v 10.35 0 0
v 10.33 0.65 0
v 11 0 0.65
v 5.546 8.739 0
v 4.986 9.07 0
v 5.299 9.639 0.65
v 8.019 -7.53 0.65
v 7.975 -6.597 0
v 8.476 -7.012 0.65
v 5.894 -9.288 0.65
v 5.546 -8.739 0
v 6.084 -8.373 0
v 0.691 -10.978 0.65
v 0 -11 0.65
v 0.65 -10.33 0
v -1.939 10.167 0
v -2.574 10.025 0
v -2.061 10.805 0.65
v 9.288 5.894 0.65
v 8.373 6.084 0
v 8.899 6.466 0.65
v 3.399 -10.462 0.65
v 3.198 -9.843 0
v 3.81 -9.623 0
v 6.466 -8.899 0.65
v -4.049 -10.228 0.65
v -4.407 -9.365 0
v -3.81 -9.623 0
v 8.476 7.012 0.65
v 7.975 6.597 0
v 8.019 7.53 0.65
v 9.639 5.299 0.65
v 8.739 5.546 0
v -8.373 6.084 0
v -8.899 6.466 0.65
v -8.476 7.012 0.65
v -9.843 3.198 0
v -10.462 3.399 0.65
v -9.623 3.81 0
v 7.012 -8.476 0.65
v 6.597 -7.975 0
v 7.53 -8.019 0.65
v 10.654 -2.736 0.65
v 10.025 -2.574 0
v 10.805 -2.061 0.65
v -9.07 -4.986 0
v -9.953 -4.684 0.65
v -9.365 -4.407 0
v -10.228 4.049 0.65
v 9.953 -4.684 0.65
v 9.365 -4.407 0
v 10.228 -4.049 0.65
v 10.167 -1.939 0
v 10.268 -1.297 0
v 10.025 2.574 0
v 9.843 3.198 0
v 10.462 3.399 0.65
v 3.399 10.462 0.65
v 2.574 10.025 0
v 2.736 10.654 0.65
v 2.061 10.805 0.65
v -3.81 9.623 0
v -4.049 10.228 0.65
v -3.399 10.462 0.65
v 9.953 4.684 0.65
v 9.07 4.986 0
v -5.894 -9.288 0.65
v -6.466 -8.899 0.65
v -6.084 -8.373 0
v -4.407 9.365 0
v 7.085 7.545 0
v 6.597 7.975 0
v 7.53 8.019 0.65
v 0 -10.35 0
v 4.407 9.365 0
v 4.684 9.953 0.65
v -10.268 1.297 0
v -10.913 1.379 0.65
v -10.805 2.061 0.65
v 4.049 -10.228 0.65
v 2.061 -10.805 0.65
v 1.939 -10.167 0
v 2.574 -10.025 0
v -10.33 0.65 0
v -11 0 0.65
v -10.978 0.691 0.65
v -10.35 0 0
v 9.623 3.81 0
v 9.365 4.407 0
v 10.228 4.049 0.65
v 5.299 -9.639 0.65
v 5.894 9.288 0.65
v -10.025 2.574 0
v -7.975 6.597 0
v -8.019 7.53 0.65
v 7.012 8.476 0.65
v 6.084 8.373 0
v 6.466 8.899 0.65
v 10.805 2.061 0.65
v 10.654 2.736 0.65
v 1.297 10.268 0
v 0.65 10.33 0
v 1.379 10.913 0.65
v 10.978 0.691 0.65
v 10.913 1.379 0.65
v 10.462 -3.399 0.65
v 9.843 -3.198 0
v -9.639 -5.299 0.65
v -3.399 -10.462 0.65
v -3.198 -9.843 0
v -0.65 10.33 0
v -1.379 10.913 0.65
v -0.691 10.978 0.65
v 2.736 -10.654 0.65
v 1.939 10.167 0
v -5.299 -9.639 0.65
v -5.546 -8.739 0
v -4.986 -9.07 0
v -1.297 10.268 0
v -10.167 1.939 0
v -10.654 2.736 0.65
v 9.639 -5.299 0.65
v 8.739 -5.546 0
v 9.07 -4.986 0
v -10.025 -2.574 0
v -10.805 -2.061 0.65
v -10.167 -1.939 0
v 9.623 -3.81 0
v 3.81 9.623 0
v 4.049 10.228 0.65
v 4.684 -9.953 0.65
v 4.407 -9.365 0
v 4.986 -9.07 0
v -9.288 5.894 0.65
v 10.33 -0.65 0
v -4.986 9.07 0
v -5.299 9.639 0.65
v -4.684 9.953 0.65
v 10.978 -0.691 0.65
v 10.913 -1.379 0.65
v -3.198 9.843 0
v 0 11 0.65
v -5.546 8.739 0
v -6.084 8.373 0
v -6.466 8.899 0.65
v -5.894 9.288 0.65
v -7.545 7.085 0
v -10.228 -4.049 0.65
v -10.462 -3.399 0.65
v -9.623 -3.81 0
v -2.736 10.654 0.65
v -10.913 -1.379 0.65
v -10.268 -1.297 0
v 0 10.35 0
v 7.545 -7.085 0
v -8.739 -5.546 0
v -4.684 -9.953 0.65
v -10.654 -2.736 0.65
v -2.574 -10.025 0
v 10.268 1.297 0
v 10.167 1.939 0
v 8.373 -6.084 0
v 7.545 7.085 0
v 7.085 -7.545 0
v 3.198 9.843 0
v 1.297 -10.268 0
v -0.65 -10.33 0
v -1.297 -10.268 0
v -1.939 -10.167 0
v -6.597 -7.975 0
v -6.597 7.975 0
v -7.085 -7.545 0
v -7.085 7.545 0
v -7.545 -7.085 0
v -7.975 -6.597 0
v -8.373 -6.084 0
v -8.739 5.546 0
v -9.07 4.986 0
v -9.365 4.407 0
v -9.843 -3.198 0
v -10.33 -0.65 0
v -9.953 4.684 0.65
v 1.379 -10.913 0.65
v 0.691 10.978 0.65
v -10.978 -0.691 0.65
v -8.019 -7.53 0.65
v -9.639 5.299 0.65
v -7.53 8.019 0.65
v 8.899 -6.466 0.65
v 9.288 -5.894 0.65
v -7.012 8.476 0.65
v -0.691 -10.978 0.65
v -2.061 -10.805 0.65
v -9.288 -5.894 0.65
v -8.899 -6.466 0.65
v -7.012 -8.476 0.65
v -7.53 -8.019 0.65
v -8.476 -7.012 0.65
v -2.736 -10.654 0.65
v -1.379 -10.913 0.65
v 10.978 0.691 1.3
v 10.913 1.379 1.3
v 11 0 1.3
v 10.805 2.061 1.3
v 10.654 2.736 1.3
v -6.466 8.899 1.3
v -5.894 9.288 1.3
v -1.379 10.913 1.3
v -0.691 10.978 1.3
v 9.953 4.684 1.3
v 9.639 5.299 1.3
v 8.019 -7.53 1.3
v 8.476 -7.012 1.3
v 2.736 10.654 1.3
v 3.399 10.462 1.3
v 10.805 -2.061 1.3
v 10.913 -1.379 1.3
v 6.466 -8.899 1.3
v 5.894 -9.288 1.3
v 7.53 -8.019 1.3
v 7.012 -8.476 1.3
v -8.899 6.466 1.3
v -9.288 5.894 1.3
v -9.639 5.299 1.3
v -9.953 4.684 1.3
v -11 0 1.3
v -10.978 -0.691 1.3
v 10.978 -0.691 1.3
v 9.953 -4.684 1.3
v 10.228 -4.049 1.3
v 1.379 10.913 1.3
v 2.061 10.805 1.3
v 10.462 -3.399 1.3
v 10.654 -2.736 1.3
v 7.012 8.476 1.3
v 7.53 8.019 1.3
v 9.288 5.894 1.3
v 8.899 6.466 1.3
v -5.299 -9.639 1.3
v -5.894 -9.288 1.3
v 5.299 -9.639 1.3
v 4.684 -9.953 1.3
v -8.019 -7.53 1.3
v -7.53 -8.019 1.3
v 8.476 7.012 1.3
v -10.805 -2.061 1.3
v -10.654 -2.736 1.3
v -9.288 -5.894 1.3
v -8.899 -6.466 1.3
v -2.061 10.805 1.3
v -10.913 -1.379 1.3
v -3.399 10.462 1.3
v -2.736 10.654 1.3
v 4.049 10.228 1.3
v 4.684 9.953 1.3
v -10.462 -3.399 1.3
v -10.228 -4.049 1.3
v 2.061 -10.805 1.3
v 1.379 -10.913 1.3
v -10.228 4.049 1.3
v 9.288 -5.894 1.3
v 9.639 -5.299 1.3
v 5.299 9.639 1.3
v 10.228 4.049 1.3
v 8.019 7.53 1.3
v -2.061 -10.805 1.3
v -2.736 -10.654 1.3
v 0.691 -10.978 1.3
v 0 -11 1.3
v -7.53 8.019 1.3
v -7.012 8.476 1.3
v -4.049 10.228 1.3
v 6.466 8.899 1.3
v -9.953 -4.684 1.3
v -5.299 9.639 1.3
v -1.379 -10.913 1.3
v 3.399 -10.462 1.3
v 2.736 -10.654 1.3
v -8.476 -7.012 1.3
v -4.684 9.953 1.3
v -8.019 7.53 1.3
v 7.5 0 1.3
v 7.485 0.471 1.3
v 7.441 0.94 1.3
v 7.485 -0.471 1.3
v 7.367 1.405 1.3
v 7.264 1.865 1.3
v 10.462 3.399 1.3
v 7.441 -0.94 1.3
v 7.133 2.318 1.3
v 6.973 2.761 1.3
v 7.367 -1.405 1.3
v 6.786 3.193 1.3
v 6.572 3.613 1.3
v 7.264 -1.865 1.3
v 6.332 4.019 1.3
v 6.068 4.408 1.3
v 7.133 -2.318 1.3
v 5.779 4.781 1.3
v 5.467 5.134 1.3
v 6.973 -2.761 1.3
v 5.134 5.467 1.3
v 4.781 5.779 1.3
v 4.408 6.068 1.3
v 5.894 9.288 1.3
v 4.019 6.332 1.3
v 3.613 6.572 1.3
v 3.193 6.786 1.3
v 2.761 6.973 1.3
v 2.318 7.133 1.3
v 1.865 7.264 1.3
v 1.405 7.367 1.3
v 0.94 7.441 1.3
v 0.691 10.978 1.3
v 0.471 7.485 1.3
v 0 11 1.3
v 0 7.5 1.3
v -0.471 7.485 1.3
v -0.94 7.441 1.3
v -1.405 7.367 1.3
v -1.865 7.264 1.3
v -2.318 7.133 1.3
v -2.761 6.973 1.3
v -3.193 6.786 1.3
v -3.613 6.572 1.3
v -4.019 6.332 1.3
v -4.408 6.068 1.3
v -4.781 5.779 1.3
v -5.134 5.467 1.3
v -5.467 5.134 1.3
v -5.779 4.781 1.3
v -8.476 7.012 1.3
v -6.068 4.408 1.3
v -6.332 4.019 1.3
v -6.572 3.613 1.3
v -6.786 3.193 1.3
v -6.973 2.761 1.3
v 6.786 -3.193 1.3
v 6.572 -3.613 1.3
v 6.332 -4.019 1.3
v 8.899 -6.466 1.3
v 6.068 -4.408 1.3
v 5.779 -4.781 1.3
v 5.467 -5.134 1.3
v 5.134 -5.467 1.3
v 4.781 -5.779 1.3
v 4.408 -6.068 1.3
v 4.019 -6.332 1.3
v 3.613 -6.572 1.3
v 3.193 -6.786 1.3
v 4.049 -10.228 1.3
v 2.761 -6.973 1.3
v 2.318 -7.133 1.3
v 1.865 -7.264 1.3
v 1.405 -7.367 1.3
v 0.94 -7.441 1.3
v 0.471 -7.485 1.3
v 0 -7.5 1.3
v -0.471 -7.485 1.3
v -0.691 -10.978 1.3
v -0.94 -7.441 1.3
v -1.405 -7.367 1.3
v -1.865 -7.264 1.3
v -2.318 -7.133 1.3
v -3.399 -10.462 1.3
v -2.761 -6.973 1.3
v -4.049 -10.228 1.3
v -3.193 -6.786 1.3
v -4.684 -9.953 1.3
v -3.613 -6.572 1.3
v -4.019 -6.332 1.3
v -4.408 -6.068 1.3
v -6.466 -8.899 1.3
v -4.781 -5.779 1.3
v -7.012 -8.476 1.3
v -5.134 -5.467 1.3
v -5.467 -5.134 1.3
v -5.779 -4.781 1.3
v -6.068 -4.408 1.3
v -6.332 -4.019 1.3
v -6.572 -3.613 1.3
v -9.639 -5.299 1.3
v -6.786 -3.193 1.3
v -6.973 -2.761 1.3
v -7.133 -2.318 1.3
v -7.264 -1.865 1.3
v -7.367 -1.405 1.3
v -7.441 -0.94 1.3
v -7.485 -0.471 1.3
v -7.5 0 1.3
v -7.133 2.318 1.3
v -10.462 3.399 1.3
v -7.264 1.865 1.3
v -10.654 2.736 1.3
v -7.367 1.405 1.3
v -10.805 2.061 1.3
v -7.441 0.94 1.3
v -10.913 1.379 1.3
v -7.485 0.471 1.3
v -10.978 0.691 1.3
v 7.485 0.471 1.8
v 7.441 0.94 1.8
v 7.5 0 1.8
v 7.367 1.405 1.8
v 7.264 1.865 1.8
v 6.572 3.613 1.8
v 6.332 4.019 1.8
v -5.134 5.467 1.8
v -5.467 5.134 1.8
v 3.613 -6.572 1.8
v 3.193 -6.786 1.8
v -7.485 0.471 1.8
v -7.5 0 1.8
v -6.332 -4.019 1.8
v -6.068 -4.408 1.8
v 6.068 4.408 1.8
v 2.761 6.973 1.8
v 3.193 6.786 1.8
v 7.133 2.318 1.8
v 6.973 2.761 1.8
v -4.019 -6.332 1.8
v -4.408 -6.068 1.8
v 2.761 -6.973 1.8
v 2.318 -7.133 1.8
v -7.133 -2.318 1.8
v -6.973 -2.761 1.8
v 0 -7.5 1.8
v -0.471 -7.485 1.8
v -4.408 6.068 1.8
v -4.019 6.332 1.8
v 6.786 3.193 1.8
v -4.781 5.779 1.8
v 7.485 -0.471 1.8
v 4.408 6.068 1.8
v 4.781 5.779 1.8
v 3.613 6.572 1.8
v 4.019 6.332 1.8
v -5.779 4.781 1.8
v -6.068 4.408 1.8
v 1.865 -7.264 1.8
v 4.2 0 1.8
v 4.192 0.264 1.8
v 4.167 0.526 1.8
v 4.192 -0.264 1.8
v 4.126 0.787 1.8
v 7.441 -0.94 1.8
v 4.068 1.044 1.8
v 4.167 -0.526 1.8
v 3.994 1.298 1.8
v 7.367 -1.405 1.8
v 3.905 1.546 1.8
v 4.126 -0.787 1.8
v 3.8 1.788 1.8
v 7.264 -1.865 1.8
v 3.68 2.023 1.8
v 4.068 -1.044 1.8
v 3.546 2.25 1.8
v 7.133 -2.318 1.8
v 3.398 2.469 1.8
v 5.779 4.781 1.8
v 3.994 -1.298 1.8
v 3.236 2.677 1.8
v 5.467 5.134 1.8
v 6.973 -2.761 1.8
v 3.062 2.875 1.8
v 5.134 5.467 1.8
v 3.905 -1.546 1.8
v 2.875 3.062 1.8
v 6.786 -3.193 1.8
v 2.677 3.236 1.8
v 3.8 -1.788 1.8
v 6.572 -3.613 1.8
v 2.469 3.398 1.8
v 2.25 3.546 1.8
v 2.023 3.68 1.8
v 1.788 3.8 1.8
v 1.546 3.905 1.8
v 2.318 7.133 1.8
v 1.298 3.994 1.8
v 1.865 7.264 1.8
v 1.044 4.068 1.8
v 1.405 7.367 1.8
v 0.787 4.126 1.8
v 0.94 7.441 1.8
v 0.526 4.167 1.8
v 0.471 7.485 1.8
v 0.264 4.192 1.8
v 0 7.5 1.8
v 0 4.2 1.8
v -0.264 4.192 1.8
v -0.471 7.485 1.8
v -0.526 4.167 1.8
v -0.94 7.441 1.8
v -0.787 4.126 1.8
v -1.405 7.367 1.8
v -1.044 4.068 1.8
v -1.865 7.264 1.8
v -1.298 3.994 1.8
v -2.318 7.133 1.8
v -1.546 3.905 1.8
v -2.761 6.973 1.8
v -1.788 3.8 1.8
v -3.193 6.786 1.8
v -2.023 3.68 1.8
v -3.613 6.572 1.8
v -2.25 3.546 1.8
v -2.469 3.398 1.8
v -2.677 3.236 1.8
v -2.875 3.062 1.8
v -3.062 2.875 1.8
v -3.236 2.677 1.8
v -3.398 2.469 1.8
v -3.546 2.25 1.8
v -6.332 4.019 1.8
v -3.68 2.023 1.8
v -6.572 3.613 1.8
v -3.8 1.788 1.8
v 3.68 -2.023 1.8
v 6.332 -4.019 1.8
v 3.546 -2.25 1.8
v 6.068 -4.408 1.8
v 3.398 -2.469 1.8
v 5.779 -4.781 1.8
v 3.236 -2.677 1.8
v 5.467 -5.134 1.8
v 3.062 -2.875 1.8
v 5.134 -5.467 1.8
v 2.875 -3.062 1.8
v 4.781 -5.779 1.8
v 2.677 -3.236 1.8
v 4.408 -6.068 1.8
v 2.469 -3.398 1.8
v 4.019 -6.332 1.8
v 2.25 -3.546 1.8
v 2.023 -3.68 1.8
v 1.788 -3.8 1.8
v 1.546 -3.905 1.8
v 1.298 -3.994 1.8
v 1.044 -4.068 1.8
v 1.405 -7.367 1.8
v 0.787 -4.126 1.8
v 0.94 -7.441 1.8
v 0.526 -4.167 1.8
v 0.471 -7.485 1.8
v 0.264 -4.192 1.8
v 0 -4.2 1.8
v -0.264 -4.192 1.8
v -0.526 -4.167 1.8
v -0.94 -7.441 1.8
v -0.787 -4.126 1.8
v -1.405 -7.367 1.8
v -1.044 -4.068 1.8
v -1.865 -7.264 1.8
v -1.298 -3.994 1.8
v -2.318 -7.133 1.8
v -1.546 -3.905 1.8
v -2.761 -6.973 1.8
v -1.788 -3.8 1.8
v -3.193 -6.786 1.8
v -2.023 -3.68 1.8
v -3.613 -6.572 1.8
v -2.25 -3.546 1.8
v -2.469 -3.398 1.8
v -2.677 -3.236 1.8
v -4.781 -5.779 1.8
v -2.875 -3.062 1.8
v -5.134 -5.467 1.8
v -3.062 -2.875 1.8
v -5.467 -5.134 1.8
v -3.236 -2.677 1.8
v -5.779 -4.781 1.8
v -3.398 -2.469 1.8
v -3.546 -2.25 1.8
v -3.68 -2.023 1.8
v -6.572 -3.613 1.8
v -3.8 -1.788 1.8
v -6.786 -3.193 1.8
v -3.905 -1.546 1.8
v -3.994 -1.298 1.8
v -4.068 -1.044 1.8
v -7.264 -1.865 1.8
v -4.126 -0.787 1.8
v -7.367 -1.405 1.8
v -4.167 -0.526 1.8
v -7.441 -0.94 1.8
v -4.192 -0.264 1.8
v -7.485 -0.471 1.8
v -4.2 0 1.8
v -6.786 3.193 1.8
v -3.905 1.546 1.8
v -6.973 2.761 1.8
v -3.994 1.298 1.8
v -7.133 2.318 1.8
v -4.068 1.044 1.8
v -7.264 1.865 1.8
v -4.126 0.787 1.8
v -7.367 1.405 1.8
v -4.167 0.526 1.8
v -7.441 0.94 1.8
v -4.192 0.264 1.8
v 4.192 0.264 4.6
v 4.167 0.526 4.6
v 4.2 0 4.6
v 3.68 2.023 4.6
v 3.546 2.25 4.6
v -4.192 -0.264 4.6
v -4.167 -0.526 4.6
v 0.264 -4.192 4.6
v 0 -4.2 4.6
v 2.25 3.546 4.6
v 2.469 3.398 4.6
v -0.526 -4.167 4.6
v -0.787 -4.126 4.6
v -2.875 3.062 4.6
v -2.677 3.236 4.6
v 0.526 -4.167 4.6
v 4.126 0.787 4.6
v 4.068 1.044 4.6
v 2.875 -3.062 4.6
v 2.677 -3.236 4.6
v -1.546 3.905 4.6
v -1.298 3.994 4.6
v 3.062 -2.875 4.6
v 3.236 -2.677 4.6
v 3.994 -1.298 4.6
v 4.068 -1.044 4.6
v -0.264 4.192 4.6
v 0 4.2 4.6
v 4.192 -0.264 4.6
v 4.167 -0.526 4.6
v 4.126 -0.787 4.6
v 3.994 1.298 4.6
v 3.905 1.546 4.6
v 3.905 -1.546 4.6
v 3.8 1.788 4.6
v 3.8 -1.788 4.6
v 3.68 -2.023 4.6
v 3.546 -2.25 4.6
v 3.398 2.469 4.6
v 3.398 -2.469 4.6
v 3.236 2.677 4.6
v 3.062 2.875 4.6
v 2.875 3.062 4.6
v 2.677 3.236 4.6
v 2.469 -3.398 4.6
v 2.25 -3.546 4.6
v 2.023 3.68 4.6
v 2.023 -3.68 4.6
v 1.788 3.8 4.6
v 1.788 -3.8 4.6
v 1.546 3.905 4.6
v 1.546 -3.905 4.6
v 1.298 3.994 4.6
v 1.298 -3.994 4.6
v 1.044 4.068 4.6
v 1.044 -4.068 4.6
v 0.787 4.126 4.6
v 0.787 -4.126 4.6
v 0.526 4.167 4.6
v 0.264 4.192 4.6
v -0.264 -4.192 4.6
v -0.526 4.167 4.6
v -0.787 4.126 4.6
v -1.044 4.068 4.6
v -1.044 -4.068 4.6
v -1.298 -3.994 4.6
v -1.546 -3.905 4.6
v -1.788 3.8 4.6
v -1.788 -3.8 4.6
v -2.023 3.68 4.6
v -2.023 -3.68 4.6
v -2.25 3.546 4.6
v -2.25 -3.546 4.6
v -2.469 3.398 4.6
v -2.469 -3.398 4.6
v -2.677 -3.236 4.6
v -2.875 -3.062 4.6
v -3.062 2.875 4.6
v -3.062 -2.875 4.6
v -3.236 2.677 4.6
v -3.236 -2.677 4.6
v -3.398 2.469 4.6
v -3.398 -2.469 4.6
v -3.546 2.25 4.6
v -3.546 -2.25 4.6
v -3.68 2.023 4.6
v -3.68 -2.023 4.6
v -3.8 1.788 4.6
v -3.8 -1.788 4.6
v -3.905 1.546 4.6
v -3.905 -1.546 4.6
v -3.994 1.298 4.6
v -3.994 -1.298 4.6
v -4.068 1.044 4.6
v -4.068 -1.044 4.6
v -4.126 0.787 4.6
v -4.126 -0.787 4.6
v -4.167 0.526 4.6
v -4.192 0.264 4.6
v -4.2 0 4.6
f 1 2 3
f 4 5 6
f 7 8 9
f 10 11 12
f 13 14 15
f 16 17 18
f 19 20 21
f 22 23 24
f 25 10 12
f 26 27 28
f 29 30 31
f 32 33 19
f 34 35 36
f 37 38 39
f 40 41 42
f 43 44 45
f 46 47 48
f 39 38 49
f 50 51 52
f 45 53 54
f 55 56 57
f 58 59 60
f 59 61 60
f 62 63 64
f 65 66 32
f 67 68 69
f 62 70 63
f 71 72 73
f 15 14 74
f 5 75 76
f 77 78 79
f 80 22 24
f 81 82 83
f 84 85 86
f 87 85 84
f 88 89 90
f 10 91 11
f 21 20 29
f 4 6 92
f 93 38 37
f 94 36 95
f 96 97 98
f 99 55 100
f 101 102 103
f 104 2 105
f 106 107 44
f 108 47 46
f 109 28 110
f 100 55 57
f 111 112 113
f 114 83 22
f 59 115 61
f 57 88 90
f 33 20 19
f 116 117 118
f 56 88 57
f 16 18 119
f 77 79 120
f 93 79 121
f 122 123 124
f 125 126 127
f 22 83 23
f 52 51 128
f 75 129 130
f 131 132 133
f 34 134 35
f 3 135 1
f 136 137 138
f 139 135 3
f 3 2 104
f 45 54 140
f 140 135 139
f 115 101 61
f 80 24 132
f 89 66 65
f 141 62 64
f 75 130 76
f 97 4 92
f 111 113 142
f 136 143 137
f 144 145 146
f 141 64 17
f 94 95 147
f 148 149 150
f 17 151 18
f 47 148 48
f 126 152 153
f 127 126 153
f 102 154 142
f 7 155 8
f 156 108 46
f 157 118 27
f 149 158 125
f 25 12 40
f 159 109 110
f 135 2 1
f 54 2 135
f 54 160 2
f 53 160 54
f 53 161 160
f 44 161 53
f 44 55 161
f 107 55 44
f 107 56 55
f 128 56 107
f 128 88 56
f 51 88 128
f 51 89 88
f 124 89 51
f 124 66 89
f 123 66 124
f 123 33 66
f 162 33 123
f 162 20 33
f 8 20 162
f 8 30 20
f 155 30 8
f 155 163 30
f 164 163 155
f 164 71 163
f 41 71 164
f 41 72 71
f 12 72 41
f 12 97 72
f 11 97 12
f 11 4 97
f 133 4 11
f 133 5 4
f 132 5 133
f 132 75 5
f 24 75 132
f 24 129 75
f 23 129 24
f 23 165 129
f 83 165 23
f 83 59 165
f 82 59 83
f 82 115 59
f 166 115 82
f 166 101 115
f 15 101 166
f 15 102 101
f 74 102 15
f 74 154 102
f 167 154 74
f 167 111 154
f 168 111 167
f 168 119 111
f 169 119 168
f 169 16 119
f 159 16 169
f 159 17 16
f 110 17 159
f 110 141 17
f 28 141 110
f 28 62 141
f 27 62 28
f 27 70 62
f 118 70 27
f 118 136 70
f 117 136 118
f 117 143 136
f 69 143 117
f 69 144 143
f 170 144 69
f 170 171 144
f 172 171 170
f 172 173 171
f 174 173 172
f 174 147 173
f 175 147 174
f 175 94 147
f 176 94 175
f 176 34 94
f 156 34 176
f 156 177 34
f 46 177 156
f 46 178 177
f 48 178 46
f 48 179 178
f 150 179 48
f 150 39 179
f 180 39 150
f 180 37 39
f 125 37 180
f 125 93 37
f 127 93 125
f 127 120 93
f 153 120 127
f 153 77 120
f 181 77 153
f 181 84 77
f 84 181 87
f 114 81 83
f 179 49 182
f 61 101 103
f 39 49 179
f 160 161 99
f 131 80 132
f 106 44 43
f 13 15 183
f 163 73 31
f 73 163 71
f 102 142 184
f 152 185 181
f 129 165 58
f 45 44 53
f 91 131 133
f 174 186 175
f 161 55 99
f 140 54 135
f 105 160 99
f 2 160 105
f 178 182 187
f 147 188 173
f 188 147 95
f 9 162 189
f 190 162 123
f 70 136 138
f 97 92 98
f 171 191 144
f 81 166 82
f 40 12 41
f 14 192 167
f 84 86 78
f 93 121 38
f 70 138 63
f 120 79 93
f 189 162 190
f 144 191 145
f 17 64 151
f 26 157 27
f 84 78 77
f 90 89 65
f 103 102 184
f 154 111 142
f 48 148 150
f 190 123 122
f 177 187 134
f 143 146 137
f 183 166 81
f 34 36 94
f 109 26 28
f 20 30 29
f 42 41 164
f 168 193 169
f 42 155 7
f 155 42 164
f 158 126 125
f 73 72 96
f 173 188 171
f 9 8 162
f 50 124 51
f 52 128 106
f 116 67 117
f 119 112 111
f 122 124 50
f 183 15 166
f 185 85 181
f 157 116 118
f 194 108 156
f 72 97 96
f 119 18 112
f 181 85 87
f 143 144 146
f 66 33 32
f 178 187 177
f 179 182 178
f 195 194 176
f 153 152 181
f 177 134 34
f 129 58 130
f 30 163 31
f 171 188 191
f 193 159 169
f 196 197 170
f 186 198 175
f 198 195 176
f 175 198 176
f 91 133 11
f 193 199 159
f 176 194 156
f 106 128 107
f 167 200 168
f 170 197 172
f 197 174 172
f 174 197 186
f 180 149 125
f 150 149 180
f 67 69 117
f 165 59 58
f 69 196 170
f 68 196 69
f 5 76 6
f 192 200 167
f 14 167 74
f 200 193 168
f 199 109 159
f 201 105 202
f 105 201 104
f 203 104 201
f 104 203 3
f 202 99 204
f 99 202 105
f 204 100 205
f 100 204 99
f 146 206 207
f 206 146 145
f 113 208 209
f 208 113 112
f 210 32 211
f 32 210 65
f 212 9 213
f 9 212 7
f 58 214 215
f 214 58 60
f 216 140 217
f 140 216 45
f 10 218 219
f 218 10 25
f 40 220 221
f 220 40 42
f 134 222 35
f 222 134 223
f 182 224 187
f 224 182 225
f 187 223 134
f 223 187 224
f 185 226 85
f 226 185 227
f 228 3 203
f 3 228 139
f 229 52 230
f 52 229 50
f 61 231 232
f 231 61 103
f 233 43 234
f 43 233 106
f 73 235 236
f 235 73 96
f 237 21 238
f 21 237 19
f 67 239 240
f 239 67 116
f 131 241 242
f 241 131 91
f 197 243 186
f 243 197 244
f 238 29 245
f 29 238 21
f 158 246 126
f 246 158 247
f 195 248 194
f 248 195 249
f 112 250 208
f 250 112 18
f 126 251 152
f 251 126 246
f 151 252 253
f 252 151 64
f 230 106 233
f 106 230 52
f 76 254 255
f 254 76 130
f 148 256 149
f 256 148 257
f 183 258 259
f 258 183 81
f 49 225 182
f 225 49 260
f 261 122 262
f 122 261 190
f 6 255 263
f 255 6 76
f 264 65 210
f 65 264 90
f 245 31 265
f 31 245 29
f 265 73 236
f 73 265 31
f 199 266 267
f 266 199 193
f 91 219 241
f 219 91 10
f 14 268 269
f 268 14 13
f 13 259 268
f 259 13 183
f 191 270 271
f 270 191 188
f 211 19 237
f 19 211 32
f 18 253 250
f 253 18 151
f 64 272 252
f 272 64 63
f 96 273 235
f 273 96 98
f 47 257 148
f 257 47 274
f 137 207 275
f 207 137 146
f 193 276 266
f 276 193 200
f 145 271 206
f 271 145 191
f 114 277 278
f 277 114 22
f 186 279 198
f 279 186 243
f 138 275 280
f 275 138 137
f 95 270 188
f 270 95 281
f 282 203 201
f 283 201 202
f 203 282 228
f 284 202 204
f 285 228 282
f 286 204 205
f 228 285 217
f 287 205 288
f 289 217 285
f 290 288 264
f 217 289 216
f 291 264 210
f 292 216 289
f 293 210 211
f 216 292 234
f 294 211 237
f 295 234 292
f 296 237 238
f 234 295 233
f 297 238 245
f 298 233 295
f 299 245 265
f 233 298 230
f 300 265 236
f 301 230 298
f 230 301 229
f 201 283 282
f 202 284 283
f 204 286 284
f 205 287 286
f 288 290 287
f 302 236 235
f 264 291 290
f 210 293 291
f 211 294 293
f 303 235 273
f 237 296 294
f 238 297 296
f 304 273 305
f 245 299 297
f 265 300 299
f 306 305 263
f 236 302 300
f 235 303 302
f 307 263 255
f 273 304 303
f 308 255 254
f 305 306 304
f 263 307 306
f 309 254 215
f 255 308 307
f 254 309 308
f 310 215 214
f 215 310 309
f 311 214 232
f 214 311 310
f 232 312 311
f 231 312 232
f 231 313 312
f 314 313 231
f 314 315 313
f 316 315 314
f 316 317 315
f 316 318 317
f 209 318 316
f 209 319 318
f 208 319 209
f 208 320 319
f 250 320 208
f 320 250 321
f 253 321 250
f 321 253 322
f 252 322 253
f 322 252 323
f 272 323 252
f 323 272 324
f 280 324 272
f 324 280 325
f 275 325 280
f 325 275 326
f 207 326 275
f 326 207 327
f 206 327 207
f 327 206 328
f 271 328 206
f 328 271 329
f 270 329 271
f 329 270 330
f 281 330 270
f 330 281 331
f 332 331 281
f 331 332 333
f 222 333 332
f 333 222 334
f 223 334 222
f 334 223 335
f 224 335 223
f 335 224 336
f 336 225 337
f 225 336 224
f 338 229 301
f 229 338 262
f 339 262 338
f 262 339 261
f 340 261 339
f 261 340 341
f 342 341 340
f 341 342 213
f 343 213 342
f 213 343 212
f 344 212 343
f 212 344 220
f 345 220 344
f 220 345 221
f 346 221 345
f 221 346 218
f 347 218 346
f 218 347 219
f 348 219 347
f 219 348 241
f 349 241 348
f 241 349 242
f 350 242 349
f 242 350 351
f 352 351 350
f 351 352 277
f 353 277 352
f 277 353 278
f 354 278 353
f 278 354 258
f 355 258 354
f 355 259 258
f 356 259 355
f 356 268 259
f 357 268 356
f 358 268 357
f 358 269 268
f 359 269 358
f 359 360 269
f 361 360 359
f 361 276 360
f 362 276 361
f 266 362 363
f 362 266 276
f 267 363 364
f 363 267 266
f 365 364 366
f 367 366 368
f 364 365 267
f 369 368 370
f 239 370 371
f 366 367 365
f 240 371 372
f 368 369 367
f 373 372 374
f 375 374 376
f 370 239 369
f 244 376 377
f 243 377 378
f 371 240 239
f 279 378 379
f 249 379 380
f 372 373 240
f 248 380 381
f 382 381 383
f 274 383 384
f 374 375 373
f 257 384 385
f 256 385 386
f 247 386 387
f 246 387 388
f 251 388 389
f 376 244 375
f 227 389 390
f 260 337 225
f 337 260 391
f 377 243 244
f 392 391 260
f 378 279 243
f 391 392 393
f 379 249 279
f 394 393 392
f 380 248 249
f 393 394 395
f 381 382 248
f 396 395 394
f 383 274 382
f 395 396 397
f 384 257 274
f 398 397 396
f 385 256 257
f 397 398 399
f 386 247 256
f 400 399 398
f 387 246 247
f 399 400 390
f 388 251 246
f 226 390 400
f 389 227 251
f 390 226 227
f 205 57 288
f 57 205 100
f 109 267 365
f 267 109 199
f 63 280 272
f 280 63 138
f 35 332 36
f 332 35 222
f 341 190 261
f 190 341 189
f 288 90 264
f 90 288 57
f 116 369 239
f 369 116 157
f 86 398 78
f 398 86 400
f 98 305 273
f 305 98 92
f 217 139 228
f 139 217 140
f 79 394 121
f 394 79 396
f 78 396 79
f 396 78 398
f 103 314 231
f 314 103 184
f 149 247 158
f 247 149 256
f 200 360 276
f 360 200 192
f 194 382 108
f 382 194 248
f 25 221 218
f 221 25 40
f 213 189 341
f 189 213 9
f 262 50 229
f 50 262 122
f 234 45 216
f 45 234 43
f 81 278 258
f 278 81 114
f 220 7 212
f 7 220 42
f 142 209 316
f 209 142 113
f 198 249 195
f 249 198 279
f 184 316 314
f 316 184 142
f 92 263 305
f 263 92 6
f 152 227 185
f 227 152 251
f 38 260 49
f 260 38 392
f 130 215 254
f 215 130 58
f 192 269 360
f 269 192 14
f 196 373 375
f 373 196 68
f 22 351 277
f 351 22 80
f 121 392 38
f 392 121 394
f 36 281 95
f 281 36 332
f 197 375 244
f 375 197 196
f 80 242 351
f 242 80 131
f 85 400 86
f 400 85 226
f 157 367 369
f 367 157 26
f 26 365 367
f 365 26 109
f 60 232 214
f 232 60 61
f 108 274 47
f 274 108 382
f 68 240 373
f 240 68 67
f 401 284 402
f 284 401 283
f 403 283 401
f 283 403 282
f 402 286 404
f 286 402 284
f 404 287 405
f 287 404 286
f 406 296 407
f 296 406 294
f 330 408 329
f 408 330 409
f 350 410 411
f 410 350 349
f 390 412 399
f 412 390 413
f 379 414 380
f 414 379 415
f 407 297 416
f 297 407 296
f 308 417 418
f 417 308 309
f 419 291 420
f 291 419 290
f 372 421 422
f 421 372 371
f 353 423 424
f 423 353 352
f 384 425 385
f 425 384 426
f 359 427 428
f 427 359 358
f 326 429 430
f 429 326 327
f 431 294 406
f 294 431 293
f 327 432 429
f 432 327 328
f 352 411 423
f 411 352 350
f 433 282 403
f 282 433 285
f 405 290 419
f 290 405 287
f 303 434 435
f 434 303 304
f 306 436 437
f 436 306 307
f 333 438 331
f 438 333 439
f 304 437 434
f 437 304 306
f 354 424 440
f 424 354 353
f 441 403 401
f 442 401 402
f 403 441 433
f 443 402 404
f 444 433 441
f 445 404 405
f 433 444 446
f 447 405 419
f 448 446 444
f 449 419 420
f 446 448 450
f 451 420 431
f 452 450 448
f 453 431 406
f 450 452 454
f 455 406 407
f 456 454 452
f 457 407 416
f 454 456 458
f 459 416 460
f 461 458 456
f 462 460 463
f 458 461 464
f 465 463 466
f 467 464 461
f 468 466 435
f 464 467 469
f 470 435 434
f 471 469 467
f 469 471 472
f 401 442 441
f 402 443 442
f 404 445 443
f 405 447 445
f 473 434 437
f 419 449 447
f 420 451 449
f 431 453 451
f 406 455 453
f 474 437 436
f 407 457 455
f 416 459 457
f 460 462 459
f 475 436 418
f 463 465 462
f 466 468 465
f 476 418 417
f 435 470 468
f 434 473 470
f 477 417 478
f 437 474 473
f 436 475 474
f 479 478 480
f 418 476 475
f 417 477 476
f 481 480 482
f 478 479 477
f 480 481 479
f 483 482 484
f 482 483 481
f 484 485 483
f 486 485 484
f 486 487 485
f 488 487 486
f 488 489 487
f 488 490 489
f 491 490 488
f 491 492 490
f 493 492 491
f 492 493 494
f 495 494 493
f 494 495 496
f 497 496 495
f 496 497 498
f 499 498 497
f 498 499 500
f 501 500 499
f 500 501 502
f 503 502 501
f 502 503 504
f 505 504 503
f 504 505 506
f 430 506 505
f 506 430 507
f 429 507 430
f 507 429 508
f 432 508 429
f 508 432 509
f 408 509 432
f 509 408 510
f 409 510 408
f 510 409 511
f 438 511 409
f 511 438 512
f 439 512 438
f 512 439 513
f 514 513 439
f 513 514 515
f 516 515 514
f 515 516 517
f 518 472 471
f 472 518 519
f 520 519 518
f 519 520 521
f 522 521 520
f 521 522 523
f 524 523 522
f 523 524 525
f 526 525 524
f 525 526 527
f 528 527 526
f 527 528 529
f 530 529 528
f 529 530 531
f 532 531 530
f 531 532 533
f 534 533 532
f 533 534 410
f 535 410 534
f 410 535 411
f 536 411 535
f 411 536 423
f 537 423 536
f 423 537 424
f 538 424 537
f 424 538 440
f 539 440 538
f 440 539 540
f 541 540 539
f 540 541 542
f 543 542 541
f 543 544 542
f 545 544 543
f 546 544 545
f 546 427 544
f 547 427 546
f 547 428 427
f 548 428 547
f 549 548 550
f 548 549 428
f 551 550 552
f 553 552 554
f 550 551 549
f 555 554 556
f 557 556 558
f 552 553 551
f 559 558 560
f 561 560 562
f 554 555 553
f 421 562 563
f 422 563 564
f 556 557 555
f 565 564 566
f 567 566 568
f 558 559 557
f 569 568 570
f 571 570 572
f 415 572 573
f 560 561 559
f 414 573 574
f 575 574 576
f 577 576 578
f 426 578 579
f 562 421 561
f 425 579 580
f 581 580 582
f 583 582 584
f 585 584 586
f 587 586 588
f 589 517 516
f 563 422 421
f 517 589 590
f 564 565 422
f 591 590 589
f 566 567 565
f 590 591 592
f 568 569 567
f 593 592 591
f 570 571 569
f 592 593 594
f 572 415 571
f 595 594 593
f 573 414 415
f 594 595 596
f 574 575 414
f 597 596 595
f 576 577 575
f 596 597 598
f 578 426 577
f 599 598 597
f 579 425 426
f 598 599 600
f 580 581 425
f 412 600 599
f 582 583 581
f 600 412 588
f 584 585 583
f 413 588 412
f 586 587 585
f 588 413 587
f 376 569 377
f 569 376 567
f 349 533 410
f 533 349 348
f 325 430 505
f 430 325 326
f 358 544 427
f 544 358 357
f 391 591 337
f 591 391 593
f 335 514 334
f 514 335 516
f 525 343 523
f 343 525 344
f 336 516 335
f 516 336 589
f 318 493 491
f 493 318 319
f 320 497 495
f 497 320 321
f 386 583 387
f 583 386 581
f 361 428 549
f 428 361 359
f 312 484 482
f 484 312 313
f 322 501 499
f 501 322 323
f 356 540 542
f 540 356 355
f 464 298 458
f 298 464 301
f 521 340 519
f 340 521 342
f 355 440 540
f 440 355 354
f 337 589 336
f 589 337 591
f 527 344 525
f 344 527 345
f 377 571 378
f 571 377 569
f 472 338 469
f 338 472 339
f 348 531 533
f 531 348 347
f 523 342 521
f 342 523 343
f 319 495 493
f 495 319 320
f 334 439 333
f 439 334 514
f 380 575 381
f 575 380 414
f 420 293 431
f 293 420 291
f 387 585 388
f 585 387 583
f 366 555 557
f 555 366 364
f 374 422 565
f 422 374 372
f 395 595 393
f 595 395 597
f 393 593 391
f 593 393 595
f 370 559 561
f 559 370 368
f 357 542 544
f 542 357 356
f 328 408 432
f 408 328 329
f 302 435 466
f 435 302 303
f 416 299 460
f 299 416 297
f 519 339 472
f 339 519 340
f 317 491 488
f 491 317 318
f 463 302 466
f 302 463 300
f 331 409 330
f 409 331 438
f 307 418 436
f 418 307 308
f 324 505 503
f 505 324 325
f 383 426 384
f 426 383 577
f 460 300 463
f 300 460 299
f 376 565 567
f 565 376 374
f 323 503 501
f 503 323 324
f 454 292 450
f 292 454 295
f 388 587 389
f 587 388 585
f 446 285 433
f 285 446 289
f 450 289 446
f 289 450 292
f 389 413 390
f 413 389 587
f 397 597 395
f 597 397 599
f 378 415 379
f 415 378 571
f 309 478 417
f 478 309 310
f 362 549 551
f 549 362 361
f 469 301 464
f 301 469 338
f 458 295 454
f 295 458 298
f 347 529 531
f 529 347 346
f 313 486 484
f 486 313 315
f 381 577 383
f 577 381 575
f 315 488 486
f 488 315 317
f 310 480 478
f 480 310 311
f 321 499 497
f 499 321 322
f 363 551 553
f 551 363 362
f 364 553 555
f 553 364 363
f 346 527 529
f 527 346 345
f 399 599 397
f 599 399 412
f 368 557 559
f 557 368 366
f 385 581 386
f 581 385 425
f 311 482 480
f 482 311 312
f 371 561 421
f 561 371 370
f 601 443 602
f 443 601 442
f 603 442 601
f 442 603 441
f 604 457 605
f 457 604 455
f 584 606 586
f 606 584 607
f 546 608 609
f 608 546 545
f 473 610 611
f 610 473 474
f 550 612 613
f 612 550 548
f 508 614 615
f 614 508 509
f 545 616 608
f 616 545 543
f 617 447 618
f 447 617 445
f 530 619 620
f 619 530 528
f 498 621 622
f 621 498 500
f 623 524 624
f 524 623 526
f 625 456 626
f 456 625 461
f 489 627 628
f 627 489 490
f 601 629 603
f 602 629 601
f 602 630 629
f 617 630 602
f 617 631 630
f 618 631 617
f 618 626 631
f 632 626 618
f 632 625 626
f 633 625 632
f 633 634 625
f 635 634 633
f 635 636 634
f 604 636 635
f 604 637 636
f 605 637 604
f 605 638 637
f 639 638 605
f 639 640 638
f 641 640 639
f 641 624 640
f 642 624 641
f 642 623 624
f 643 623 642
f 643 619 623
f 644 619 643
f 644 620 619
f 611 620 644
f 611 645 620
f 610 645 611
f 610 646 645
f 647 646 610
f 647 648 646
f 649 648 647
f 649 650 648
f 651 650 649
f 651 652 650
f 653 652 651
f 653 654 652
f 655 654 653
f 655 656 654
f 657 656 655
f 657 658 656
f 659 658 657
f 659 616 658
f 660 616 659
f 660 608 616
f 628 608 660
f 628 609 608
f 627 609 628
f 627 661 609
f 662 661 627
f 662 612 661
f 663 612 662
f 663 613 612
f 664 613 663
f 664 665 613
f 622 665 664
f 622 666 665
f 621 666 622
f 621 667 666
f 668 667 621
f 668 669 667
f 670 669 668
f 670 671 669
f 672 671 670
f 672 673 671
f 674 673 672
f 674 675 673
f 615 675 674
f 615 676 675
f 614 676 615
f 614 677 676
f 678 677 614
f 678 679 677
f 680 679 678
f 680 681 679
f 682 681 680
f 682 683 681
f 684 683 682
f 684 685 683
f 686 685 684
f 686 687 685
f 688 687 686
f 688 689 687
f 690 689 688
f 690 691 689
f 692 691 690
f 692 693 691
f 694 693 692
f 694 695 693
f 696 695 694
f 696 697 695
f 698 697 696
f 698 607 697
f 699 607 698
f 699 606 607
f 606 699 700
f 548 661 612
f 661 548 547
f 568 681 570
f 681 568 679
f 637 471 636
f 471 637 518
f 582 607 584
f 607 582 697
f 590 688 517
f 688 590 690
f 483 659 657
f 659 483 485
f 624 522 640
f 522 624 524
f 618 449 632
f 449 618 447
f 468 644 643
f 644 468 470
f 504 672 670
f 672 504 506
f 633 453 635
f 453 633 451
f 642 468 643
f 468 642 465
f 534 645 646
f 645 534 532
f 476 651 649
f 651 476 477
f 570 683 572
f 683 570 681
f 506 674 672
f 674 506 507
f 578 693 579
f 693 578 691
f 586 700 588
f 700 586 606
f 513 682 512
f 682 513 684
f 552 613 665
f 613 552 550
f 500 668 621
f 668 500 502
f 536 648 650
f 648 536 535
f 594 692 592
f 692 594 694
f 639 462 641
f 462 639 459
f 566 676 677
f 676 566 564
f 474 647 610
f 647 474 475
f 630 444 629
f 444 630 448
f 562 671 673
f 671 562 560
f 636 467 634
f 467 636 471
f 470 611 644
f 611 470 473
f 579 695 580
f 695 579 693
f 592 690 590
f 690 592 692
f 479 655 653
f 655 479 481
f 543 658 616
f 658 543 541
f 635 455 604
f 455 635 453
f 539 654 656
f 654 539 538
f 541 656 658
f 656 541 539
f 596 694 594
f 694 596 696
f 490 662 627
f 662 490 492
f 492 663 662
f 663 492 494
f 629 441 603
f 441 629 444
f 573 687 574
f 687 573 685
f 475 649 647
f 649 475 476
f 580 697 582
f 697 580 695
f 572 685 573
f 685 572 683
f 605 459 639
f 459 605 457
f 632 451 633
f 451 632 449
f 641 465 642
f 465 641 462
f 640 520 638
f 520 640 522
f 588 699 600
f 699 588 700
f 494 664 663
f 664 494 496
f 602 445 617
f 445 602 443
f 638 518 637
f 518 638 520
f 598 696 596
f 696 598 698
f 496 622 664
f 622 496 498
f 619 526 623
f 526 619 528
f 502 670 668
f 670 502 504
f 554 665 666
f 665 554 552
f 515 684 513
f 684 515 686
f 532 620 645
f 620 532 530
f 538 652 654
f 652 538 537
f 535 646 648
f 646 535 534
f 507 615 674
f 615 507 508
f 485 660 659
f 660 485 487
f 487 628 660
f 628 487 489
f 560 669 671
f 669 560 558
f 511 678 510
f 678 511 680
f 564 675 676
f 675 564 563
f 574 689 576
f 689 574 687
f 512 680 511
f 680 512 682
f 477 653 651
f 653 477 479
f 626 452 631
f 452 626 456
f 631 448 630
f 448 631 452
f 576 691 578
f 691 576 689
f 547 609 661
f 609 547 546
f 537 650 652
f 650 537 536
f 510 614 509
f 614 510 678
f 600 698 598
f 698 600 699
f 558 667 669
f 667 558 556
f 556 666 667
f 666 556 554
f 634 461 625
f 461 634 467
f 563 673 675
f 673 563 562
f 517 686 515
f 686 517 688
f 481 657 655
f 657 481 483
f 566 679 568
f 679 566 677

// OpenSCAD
//Bearing cap for fidget spinners

/* [Bearing Dimensions] */
bearing_thickness=7; // 
bearing_outer_diameter=22; // 
bearing_inner_diameter=8; // 
/* [Cap Parameters] */
plate_thickness=1.3; // 
air_gap=0.5; // 
oversize_for_clamping=0.4; // 
oversize_main_plate=0; // 
/* [Hidden] */
phase=min(plate_thickness/2,1); 

$fn = 100;
cylinder(phase,d1=bearing_outer_diameter+oversize_main_plate-phase*2,d2=bearing_outer_diameter+oversize_main_plate,center=false);
translate([0,0,phase]){
cylinder(plate_thickness-phase,d=bearing_outer_diameter+oversize_main_plate,center=false);   //main plate
}
translate([0,0,plate_thickness]){
cylinder(air_gap,d=bearing_inner_diameter+(bearing_outer_diameter-bearing_inner_diameter)/2,center=false);
}
translate([0,0,plate_thickness+air_gap]){
cylinder(min(bearing_thickness/2-0.7,5),d=bearing_inner_diameter+oversize_for_clamping,center=false);
}

echo(version=version());
